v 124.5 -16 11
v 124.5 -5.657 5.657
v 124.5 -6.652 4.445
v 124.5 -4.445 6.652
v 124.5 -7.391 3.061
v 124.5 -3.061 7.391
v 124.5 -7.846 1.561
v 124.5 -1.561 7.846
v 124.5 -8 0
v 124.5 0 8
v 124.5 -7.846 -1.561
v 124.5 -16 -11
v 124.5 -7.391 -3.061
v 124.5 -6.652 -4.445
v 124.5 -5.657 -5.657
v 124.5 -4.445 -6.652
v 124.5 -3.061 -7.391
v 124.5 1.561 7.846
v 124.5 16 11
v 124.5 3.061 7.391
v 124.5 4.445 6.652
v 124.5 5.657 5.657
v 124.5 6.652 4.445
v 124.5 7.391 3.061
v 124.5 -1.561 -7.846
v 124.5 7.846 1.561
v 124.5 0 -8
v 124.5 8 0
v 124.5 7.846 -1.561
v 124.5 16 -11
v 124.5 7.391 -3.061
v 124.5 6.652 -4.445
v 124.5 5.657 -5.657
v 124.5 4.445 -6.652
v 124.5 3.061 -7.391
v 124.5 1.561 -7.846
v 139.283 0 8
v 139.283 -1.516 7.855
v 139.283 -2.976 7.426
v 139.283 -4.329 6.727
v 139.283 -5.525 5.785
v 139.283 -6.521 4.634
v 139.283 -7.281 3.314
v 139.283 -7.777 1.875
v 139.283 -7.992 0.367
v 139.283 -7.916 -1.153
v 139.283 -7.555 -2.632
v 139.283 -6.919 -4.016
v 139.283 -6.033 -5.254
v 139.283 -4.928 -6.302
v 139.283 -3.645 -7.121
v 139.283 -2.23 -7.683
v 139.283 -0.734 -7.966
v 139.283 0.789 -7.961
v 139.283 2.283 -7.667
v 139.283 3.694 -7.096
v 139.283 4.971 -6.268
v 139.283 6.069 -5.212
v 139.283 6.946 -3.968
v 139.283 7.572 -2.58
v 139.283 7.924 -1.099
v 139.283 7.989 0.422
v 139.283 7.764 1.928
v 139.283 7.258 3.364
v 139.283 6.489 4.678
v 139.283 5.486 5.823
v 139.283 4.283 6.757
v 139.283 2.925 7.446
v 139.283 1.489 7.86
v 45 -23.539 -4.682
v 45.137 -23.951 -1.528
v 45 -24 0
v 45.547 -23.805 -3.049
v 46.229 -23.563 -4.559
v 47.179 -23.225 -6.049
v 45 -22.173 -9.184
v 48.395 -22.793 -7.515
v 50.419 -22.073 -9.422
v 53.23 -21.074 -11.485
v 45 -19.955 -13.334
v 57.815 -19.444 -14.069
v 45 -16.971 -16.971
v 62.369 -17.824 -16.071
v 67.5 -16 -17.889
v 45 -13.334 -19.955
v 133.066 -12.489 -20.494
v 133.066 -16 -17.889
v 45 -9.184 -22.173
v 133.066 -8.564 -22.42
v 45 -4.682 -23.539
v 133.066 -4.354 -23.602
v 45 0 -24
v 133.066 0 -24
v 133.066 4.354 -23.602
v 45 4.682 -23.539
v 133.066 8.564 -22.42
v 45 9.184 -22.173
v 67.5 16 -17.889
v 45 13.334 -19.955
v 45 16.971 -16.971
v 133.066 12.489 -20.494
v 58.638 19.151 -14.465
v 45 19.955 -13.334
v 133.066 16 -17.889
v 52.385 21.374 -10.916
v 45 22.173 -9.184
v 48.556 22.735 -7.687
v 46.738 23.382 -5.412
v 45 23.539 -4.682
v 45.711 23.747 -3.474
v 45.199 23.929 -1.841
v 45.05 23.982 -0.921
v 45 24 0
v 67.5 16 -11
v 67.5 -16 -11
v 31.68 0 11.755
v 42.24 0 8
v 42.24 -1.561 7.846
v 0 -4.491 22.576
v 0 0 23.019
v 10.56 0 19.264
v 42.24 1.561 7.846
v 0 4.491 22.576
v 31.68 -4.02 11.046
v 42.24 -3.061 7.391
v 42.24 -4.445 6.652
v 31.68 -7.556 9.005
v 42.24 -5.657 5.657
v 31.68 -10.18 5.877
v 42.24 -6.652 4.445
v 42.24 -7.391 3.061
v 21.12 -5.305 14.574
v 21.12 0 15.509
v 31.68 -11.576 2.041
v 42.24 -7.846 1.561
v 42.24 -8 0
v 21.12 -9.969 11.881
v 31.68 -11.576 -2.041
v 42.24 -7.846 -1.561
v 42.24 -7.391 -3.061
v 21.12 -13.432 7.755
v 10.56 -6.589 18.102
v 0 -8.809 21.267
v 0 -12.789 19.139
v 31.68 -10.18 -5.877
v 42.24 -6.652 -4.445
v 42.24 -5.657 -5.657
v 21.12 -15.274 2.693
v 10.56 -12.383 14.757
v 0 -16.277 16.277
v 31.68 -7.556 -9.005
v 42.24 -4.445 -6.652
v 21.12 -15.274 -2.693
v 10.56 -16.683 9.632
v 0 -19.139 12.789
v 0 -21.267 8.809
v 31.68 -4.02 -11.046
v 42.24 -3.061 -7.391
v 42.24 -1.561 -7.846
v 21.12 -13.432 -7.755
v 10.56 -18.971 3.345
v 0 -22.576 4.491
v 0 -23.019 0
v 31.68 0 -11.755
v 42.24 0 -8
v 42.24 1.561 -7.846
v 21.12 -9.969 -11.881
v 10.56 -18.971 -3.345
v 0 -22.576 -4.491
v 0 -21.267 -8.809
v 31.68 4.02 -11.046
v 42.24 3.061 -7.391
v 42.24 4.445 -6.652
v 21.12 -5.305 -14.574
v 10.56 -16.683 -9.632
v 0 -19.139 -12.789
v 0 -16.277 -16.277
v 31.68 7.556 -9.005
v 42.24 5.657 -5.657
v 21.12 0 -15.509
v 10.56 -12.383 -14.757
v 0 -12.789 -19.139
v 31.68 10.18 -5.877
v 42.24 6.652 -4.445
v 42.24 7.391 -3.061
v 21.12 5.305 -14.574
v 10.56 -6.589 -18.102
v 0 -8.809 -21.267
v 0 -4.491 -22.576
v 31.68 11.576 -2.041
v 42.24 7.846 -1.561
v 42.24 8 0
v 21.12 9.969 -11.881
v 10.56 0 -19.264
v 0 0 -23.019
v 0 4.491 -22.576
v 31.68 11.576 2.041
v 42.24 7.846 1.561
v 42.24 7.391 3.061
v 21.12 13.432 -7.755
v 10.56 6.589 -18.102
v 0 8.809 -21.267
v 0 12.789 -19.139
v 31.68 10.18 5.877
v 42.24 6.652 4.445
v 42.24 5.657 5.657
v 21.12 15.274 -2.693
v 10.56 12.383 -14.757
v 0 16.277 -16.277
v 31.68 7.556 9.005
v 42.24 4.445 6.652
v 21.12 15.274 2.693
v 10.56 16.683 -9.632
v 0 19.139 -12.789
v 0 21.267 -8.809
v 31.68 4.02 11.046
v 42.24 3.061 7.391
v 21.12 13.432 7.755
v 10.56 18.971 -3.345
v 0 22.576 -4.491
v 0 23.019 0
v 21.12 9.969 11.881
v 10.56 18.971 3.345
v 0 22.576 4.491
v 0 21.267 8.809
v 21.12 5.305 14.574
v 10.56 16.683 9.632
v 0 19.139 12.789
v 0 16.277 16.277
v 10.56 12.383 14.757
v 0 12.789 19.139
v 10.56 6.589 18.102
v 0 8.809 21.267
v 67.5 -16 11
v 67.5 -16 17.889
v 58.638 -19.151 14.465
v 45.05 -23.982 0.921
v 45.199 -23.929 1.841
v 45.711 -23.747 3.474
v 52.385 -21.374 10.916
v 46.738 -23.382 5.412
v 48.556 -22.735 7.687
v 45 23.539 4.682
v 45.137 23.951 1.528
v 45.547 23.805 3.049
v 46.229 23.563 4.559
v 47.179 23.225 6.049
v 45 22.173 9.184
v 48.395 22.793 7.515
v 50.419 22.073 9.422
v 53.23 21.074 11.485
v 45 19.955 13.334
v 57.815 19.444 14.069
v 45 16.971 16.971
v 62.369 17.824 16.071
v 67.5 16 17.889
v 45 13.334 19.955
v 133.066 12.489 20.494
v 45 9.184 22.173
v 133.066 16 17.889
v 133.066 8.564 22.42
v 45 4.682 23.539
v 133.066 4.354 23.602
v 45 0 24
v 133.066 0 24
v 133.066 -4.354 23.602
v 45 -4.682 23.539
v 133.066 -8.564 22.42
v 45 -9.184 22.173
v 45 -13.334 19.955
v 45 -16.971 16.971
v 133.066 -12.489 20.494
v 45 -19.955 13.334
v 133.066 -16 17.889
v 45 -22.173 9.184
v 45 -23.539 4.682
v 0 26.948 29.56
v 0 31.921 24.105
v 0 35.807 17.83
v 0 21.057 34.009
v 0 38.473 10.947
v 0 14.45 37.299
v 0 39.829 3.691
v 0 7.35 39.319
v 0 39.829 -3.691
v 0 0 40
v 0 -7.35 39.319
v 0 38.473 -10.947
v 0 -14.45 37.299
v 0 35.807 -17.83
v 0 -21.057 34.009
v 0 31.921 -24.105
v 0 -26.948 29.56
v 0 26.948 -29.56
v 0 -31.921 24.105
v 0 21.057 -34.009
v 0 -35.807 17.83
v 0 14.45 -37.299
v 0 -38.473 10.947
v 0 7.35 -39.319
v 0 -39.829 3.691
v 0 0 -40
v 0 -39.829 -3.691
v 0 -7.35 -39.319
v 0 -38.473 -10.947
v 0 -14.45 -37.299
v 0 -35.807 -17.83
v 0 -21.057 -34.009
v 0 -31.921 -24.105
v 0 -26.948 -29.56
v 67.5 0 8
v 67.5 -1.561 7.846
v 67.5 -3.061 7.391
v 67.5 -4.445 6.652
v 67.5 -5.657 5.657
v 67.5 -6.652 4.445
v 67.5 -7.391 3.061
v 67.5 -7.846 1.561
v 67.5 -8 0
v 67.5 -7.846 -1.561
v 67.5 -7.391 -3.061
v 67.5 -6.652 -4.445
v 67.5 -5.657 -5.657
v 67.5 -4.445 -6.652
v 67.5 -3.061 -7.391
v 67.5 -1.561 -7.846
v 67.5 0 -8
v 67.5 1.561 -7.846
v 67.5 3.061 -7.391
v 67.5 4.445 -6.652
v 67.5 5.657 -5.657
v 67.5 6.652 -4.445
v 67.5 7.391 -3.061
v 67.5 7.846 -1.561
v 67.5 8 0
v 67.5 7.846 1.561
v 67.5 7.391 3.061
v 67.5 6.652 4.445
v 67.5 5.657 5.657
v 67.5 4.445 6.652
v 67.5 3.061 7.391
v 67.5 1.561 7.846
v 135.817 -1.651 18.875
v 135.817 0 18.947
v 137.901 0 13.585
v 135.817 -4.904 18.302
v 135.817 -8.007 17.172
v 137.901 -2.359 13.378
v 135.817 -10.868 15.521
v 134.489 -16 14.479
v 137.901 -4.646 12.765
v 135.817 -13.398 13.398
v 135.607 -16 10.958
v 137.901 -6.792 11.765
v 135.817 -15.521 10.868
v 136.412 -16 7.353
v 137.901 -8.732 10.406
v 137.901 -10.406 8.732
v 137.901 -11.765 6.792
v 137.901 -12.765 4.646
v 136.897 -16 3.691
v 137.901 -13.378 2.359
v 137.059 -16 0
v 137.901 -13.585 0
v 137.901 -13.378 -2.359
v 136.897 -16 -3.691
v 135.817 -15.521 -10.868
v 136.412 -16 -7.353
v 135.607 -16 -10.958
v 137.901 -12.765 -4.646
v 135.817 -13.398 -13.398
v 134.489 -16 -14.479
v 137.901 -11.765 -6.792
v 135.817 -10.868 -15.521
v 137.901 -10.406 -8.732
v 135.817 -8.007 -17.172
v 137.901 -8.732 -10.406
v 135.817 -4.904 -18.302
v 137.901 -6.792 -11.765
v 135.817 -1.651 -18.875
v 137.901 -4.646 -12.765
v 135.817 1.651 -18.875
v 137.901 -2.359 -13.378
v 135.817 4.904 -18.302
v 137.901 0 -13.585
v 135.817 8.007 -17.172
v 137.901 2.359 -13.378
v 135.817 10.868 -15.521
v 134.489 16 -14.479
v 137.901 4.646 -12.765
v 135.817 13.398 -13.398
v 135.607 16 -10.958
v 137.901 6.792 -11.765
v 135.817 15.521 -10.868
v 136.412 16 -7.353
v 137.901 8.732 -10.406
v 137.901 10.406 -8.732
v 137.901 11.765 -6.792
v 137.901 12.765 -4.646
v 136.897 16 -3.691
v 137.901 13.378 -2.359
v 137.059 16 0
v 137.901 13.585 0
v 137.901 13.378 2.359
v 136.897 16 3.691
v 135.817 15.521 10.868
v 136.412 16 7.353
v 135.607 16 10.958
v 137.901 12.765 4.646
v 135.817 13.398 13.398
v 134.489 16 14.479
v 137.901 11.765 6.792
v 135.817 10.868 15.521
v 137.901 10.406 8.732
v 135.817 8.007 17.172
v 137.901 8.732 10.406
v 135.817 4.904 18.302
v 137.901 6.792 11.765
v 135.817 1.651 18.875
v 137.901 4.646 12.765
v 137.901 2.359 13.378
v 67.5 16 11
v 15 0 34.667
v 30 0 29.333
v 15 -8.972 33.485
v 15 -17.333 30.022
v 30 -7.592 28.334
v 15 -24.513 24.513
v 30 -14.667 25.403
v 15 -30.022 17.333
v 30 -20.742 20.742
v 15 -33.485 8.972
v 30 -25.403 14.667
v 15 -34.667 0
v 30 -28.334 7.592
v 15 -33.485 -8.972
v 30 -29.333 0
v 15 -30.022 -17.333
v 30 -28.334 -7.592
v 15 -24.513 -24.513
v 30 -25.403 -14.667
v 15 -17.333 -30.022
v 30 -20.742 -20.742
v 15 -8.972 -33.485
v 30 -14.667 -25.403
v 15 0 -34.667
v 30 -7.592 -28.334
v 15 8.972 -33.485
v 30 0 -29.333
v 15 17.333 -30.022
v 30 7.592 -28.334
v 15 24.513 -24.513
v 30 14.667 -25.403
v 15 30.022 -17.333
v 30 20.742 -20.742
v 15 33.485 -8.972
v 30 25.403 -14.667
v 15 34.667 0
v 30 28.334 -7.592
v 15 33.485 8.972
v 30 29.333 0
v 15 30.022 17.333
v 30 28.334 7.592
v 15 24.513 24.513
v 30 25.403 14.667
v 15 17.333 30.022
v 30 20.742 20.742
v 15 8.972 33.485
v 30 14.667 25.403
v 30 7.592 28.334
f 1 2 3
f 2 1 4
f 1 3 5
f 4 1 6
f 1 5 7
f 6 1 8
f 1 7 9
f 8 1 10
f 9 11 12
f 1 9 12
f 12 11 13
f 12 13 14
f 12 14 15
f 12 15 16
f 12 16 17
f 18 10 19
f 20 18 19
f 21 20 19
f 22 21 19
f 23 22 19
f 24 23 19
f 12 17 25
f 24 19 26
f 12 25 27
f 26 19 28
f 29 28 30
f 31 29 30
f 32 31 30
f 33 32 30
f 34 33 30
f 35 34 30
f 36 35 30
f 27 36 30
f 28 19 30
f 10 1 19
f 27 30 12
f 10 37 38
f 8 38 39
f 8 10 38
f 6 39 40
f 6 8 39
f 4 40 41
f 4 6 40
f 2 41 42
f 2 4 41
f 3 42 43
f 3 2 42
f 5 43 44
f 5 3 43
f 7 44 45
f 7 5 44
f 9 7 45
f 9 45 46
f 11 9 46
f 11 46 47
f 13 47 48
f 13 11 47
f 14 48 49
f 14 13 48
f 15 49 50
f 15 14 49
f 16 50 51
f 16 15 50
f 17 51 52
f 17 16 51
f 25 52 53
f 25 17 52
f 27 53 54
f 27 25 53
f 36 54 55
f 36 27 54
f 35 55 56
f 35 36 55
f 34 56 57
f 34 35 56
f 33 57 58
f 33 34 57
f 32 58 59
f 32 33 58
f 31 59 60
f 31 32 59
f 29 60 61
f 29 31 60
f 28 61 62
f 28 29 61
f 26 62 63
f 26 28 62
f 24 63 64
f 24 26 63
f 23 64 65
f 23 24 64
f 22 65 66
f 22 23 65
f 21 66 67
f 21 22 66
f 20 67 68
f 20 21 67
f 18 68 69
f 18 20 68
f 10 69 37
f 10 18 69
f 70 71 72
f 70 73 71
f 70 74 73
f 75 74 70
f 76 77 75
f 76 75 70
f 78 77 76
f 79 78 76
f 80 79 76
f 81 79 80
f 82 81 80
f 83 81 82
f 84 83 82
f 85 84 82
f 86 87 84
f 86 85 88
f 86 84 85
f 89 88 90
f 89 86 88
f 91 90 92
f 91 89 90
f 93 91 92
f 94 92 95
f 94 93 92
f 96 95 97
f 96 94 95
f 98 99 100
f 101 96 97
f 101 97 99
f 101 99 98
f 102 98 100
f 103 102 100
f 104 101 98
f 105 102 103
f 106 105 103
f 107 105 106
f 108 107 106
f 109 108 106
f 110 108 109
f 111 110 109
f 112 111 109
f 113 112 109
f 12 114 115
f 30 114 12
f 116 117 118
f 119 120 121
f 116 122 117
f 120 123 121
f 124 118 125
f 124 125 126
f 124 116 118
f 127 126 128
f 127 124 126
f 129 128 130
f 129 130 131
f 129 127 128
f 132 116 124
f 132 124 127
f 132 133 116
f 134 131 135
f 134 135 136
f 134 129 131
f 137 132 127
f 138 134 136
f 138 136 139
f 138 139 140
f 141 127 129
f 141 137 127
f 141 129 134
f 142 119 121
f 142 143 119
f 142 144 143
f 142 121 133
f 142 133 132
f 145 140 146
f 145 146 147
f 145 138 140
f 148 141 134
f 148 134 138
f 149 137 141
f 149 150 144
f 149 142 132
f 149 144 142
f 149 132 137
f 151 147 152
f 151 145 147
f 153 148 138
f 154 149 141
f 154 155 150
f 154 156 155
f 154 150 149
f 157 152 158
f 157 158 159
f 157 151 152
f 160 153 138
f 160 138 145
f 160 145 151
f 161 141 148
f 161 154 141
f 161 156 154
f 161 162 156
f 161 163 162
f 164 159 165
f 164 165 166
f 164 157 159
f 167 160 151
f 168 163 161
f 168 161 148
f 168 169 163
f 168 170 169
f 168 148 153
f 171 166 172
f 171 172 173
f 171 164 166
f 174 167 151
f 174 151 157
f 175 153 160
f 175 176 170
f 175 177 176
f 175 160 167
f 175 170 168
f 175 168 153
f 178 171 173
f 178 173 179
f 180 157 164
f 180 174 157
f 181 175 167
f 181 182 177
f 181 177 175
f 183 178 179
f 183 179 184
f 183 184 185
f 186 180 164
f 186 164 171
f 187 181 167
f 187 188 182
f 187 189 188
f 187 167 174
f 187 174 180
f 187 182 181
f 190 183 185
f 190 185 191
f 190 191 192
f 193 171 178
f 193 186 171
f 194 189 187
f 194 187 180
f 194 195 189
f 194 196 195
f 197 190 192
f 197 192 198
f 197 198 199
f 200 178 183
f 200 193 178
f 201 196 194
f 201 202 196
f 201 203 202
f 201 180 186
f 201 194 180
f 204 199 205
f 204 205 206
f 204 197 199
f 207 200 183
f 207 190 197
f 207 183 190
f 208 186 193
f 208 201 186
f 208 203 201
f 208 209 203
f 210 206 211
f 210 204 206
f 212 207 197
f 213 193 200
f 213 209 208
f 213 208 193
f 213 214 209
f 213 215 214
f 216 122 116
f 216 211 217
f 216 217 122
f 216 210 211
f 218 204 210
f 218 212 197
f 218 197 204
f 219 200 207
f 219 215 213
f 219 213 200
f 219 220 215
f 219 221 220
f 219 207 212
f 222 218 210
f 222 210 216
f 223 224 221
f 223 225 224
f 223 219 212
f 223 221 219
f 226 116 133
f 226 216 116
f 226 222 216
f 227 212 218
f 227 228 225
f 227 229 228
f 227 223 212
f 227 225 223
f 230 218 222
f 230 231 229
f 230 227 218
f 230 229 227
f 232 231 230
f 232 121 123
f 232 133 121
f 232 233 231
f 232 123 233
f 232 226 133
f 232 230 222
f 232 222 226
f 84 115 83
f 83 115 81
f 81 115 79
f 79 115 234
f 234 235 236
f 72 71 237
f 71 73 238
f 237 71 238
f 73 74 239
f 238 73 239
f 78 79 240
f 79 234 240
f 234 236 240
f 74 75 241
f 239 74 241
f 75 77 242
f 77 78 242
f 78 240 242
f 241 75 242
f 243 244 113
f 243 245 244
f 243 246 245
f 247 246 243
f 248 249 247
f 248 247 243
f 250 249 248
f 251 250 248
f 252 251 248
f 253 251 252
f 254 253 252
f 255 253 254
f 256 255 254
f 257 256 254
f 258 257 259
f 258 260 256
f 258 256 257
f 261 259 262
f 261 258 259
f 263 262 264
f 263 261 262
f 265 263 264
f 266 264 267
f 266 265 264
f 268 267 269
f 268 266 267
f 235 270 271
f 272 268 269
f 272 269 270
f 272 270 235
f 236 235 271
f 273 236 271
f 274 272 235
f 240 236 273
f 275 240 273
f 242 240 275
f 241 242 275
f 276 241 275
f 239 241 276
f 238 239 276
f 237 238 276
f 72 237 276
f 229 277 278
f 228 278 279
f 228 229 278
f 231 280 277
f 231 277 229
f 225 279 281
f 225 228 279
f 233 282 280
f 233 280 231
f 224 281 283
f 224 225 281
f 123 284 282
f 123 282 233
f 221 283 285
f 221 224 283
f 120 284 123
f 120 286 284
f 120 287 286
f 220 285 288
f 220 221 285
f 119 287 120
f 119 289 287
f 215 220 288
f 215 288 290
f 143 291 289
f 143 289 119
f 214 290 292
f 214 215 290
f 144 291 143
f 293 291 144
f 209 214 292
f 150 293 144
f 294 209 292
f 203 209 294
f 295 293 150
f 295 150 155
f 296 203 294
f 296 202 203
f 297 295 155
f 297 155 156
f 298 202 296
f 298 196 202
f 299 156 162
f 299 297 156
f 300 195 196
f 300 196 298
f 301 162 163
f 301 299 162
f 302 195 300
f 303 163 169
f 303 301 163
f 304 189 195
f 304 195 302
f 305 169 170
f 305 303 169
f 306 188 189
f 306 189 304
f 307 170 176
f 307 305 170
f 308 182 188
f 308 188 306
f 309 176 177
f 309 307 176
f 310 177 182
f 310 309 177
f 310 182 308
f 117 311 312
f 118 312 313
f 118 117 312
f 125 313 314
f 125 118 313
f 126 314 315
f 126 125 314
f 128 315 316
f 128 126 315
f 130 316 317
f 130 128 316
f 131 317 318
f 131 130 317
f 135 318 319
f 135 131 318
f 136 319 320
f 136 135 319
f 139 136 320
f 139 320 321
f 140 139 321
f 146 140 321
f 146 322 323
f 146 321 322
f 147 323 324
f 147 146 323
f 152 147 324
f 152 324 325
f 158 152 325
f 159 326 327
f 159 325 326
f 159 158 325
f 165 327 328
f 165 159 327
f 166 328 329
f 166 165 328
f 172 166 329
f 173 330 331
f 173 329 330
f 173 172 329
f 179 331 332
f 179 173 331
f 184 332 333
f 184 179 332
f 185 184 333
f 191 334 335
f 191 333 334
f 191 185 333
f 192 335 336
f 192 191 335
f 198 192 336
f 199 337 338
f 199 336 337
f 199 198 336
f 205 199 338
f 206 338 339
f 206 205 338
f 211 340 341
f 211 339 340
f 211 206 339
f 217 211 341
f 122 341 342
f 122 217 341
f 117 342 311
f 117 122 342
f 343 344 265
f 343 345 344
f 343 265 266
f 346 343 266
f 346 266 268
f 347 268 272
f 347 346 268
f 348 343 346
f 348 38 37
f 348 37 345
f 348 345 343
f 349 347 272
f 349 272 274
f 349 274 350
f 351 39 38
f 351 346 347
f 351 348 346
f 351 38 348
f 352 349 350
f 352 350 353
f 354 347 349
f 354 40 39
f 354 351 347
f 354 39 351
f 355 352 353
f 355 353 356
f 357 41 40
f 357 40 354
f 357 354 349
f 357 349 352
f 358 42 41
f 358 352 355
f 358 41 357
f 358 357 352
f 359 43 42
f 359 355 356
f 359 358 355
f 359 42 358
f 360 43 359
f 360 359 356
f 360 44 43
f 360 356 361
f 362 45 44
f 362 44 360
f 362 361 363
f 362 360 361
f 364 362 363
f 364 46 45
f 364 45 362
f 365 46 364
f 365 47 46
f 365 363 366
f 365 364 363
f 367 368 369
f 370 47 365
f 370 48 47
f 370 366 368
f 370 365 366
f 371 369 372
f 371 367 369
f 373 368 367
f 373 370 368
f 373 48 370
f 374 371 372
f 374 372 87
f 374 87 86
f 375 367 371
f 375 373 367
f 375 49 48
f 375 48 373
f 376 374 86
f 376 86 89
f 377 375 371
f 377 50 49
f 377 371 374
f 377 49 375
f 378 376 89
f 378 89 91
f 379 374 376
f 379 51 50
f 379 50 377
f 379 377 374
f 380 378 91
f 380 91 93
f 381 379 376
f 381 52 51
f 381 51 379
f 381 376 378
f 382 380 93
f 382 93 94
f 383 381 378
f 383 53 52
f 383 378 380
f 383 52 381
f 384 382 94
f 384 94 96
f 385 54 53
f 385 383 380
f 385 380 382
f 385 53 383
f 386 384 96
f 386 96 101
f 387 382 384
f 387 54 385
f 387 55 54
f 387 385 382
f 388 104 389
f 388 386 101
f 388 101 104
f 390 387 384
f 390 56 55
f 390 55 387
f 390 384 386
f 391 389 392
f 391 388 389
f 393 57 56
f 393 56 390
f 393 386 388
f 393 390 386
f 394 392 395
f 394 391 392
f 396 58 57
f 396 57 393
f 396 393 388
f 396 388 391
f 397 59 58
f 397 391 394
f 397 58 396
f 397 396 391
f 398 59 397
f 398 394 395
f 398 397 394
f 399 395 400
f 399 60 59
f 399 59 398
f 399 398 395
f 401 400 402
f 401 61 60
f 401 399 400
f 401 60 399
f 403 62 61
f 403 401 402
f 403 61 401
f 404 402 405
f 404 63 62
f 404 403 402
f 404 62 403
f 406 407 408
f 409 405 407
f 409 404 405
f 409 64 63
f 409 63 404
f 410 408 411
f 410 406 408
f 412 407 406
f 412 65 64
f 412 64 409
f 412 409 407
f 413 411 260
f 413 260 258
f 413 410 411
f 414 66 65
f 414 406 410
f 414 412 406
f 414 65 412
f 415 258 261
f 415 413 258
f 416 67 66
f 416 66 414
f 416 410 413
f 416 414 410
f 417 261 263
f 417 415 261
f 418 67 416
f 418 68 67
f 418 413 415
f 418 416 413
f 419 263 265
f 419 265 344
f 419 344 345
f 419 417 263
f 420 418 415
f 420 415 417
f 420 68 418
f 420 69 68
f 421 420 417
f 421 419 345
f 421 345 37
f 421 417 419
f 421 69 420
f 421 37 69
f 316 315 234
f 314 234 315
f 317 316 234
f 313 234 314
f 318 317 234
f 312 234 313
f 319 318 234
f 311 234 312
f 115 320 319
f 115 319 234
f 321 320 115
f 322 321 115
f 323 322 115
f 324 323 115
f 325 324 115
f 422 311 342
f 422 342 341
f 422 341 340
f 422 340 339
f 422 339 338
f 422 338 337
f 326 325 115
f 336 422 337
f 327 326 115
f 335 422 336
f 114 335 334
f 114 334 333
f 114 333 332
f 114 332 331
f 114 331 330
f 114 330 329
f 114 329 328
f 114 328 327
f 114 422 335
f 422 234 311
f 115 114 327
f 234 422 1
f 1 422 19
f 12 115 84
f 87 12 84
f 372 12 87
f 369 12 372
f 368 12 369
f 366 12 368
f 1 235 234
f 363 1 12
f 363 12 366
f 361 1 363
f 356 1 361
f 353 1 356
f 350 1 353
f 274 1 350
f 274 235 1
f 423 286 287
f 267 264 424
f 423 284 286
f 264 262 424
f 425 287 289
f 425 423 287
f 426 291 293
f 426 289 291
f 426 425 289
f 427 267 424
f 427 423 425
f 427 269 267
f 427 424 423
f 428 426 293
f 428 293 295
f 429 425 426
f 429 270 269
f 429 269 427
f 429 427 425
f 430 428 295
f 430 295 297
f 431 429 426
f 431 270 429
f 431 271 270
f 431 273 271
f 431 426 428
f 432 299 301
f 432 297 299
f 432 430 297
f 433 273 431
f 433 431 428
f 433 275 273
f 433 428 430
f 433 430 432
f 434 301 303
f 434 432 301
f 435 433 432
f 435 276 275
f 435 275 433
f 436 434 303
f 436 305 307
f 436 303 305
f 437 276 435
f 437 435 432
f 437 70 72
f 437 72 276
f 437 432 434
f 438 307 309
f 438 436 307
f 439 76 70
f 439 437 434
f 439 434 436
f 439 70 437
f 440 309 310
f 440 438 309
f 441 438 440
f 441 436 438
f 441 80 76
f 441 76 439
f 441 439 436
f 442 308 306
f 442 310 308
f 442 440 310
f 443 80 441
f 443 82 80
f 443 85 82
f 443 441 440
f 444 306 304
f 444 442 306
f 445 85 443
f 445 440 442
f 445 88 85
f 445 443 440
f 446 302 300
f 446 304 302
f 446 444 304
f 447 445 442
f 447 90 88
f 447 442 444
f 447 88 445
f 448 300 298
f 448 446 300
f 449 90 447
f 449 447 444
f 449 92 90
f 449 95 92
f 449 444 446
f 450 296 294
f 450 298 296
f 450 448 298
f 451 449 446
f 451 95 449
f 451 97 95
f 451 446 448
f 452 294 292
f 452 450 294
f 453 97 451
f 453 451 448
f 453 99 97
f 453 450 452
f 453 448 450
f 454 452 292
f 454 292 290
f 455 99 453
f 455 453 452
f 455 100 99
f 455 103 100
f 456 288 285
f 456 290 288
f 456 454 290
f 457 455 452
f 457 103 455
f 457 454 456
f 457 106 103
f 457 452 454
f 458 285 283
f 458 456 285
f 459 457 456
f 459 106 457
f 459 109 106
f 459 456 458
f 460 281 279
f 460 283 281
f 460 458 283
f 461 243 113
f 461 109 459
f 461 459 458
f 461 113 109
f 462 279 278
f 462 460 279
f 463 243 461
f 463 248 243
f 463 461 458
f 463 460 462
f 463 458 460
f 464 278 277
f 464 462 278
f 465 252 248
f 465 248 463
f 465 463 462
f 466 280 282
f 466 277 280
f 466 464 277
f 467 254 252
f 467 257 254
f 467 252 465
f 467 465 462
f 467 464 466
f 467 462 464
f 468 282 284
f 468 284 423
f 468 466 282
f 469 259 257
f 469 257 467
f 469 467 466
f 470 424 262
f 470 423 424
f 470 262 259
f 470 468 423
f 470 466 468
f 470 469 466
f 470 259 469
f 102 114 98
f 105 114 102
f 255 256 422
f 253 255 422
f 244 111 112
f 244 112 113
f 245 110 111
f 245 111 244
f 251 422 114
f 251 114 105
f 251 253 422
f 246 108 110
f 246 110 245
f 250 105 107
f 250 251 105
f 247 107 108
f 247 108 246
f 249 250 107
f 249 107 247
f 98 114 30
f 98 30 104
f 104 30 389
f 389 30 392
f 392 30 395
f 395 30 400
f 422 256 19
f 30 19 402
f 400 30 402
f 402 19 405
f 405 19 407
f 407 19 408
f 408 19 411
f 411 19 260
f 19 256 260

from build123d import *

# Parameters (mm, degrees)
CUT_EXTRUDE1_DEPTH = 151.996688705
SKETCH4_W          = 57
SKETCH4_H          = 22
CUT_EXTRUDE2_DEPTH = 156.357021604


with BuildPart() as part:
    # Sketch1 → Revolve1 (revolve)
    with BuildSketch(Plane(origin=(0, 0, 0), x_dir=(1, 0, 0), z_dir=(0, 1, 0)), mode=Mode.PRIVATE) as revolve1_sk:
        with BuildLine():
            Line((0, 0), (0, 40))
            Line((0, 40), (45, 24))
            Line((45, 24), (133.065732621, 24))
            ThreePointArc((133.065732621, 24), (138.23168958, 12.490837283), (140, 0))
            Line((140, 0), (0, 0))
        make_face()
    revolve(revolve1_sk.sketch.rotate(Axis((0, 0, 0), (1, 0, 0)), 180), axis=Axis((0, 0, 0), (1, 0, 0)))

    # Sketch2 → Cut-Extrude1 (cut, symmetric)
    with BuildSketch(Plane.XY):
        Polygon((469.549791622, 16), (137.05948169, 16), (67.5, 16), (0, 40), (-313.277254393, 151.387468229), (-199.953261752, 806.640776108), (582.873784263, 671.253307879), align=None)
    cut_extrude1 = extrude(amount=CUT_EXTRUDE1_DEPTH, both=True, mode=Mode.SUBTRACT)

    # Mirror1: Cut-Extrude1 across plane
    add(cut_extrude1.mirror(Plane.ZX), mode=Mode.SUBTRACT)

    # Sketch3 → Cut-Revolve2 (revolve, cut)
    with BuildSketch(Plane(origin=(0, 0, 0), x_dir=(1, 0, 0), z_dir=(0, 1, 0)), mode=Mode.PRIVATE) as cut_revolve2_sk:
        Polygon((0, 23.01873218), (0, 0), (140, 0), (140, 8), (42.240184255, 8), align=None)
    revolve(cut_revolve2_sk.sketch.rotate(Axis((0, 0, 0), (1, 0, 0)), 180), axis=Axis((0, 0, 0), (1, 0, 0)), mode=Mode.SUBTRACT)

    # Sketch4 → Cut-Extrude2 (cut, through all)
    with BuildSketch(Plane(origin=(0, 16, 0), x_dir=(1, 0, 0), z_dir=(0, 1, 0))):
        with Locations((96, 0)):
            Rectangle(SKETCH4_W, SKETCH4_H)
    extrude(amount=-CUT_EXTRUDE2_DEPTH, mode=Mode.SUBTRACT)


solid = part.part
